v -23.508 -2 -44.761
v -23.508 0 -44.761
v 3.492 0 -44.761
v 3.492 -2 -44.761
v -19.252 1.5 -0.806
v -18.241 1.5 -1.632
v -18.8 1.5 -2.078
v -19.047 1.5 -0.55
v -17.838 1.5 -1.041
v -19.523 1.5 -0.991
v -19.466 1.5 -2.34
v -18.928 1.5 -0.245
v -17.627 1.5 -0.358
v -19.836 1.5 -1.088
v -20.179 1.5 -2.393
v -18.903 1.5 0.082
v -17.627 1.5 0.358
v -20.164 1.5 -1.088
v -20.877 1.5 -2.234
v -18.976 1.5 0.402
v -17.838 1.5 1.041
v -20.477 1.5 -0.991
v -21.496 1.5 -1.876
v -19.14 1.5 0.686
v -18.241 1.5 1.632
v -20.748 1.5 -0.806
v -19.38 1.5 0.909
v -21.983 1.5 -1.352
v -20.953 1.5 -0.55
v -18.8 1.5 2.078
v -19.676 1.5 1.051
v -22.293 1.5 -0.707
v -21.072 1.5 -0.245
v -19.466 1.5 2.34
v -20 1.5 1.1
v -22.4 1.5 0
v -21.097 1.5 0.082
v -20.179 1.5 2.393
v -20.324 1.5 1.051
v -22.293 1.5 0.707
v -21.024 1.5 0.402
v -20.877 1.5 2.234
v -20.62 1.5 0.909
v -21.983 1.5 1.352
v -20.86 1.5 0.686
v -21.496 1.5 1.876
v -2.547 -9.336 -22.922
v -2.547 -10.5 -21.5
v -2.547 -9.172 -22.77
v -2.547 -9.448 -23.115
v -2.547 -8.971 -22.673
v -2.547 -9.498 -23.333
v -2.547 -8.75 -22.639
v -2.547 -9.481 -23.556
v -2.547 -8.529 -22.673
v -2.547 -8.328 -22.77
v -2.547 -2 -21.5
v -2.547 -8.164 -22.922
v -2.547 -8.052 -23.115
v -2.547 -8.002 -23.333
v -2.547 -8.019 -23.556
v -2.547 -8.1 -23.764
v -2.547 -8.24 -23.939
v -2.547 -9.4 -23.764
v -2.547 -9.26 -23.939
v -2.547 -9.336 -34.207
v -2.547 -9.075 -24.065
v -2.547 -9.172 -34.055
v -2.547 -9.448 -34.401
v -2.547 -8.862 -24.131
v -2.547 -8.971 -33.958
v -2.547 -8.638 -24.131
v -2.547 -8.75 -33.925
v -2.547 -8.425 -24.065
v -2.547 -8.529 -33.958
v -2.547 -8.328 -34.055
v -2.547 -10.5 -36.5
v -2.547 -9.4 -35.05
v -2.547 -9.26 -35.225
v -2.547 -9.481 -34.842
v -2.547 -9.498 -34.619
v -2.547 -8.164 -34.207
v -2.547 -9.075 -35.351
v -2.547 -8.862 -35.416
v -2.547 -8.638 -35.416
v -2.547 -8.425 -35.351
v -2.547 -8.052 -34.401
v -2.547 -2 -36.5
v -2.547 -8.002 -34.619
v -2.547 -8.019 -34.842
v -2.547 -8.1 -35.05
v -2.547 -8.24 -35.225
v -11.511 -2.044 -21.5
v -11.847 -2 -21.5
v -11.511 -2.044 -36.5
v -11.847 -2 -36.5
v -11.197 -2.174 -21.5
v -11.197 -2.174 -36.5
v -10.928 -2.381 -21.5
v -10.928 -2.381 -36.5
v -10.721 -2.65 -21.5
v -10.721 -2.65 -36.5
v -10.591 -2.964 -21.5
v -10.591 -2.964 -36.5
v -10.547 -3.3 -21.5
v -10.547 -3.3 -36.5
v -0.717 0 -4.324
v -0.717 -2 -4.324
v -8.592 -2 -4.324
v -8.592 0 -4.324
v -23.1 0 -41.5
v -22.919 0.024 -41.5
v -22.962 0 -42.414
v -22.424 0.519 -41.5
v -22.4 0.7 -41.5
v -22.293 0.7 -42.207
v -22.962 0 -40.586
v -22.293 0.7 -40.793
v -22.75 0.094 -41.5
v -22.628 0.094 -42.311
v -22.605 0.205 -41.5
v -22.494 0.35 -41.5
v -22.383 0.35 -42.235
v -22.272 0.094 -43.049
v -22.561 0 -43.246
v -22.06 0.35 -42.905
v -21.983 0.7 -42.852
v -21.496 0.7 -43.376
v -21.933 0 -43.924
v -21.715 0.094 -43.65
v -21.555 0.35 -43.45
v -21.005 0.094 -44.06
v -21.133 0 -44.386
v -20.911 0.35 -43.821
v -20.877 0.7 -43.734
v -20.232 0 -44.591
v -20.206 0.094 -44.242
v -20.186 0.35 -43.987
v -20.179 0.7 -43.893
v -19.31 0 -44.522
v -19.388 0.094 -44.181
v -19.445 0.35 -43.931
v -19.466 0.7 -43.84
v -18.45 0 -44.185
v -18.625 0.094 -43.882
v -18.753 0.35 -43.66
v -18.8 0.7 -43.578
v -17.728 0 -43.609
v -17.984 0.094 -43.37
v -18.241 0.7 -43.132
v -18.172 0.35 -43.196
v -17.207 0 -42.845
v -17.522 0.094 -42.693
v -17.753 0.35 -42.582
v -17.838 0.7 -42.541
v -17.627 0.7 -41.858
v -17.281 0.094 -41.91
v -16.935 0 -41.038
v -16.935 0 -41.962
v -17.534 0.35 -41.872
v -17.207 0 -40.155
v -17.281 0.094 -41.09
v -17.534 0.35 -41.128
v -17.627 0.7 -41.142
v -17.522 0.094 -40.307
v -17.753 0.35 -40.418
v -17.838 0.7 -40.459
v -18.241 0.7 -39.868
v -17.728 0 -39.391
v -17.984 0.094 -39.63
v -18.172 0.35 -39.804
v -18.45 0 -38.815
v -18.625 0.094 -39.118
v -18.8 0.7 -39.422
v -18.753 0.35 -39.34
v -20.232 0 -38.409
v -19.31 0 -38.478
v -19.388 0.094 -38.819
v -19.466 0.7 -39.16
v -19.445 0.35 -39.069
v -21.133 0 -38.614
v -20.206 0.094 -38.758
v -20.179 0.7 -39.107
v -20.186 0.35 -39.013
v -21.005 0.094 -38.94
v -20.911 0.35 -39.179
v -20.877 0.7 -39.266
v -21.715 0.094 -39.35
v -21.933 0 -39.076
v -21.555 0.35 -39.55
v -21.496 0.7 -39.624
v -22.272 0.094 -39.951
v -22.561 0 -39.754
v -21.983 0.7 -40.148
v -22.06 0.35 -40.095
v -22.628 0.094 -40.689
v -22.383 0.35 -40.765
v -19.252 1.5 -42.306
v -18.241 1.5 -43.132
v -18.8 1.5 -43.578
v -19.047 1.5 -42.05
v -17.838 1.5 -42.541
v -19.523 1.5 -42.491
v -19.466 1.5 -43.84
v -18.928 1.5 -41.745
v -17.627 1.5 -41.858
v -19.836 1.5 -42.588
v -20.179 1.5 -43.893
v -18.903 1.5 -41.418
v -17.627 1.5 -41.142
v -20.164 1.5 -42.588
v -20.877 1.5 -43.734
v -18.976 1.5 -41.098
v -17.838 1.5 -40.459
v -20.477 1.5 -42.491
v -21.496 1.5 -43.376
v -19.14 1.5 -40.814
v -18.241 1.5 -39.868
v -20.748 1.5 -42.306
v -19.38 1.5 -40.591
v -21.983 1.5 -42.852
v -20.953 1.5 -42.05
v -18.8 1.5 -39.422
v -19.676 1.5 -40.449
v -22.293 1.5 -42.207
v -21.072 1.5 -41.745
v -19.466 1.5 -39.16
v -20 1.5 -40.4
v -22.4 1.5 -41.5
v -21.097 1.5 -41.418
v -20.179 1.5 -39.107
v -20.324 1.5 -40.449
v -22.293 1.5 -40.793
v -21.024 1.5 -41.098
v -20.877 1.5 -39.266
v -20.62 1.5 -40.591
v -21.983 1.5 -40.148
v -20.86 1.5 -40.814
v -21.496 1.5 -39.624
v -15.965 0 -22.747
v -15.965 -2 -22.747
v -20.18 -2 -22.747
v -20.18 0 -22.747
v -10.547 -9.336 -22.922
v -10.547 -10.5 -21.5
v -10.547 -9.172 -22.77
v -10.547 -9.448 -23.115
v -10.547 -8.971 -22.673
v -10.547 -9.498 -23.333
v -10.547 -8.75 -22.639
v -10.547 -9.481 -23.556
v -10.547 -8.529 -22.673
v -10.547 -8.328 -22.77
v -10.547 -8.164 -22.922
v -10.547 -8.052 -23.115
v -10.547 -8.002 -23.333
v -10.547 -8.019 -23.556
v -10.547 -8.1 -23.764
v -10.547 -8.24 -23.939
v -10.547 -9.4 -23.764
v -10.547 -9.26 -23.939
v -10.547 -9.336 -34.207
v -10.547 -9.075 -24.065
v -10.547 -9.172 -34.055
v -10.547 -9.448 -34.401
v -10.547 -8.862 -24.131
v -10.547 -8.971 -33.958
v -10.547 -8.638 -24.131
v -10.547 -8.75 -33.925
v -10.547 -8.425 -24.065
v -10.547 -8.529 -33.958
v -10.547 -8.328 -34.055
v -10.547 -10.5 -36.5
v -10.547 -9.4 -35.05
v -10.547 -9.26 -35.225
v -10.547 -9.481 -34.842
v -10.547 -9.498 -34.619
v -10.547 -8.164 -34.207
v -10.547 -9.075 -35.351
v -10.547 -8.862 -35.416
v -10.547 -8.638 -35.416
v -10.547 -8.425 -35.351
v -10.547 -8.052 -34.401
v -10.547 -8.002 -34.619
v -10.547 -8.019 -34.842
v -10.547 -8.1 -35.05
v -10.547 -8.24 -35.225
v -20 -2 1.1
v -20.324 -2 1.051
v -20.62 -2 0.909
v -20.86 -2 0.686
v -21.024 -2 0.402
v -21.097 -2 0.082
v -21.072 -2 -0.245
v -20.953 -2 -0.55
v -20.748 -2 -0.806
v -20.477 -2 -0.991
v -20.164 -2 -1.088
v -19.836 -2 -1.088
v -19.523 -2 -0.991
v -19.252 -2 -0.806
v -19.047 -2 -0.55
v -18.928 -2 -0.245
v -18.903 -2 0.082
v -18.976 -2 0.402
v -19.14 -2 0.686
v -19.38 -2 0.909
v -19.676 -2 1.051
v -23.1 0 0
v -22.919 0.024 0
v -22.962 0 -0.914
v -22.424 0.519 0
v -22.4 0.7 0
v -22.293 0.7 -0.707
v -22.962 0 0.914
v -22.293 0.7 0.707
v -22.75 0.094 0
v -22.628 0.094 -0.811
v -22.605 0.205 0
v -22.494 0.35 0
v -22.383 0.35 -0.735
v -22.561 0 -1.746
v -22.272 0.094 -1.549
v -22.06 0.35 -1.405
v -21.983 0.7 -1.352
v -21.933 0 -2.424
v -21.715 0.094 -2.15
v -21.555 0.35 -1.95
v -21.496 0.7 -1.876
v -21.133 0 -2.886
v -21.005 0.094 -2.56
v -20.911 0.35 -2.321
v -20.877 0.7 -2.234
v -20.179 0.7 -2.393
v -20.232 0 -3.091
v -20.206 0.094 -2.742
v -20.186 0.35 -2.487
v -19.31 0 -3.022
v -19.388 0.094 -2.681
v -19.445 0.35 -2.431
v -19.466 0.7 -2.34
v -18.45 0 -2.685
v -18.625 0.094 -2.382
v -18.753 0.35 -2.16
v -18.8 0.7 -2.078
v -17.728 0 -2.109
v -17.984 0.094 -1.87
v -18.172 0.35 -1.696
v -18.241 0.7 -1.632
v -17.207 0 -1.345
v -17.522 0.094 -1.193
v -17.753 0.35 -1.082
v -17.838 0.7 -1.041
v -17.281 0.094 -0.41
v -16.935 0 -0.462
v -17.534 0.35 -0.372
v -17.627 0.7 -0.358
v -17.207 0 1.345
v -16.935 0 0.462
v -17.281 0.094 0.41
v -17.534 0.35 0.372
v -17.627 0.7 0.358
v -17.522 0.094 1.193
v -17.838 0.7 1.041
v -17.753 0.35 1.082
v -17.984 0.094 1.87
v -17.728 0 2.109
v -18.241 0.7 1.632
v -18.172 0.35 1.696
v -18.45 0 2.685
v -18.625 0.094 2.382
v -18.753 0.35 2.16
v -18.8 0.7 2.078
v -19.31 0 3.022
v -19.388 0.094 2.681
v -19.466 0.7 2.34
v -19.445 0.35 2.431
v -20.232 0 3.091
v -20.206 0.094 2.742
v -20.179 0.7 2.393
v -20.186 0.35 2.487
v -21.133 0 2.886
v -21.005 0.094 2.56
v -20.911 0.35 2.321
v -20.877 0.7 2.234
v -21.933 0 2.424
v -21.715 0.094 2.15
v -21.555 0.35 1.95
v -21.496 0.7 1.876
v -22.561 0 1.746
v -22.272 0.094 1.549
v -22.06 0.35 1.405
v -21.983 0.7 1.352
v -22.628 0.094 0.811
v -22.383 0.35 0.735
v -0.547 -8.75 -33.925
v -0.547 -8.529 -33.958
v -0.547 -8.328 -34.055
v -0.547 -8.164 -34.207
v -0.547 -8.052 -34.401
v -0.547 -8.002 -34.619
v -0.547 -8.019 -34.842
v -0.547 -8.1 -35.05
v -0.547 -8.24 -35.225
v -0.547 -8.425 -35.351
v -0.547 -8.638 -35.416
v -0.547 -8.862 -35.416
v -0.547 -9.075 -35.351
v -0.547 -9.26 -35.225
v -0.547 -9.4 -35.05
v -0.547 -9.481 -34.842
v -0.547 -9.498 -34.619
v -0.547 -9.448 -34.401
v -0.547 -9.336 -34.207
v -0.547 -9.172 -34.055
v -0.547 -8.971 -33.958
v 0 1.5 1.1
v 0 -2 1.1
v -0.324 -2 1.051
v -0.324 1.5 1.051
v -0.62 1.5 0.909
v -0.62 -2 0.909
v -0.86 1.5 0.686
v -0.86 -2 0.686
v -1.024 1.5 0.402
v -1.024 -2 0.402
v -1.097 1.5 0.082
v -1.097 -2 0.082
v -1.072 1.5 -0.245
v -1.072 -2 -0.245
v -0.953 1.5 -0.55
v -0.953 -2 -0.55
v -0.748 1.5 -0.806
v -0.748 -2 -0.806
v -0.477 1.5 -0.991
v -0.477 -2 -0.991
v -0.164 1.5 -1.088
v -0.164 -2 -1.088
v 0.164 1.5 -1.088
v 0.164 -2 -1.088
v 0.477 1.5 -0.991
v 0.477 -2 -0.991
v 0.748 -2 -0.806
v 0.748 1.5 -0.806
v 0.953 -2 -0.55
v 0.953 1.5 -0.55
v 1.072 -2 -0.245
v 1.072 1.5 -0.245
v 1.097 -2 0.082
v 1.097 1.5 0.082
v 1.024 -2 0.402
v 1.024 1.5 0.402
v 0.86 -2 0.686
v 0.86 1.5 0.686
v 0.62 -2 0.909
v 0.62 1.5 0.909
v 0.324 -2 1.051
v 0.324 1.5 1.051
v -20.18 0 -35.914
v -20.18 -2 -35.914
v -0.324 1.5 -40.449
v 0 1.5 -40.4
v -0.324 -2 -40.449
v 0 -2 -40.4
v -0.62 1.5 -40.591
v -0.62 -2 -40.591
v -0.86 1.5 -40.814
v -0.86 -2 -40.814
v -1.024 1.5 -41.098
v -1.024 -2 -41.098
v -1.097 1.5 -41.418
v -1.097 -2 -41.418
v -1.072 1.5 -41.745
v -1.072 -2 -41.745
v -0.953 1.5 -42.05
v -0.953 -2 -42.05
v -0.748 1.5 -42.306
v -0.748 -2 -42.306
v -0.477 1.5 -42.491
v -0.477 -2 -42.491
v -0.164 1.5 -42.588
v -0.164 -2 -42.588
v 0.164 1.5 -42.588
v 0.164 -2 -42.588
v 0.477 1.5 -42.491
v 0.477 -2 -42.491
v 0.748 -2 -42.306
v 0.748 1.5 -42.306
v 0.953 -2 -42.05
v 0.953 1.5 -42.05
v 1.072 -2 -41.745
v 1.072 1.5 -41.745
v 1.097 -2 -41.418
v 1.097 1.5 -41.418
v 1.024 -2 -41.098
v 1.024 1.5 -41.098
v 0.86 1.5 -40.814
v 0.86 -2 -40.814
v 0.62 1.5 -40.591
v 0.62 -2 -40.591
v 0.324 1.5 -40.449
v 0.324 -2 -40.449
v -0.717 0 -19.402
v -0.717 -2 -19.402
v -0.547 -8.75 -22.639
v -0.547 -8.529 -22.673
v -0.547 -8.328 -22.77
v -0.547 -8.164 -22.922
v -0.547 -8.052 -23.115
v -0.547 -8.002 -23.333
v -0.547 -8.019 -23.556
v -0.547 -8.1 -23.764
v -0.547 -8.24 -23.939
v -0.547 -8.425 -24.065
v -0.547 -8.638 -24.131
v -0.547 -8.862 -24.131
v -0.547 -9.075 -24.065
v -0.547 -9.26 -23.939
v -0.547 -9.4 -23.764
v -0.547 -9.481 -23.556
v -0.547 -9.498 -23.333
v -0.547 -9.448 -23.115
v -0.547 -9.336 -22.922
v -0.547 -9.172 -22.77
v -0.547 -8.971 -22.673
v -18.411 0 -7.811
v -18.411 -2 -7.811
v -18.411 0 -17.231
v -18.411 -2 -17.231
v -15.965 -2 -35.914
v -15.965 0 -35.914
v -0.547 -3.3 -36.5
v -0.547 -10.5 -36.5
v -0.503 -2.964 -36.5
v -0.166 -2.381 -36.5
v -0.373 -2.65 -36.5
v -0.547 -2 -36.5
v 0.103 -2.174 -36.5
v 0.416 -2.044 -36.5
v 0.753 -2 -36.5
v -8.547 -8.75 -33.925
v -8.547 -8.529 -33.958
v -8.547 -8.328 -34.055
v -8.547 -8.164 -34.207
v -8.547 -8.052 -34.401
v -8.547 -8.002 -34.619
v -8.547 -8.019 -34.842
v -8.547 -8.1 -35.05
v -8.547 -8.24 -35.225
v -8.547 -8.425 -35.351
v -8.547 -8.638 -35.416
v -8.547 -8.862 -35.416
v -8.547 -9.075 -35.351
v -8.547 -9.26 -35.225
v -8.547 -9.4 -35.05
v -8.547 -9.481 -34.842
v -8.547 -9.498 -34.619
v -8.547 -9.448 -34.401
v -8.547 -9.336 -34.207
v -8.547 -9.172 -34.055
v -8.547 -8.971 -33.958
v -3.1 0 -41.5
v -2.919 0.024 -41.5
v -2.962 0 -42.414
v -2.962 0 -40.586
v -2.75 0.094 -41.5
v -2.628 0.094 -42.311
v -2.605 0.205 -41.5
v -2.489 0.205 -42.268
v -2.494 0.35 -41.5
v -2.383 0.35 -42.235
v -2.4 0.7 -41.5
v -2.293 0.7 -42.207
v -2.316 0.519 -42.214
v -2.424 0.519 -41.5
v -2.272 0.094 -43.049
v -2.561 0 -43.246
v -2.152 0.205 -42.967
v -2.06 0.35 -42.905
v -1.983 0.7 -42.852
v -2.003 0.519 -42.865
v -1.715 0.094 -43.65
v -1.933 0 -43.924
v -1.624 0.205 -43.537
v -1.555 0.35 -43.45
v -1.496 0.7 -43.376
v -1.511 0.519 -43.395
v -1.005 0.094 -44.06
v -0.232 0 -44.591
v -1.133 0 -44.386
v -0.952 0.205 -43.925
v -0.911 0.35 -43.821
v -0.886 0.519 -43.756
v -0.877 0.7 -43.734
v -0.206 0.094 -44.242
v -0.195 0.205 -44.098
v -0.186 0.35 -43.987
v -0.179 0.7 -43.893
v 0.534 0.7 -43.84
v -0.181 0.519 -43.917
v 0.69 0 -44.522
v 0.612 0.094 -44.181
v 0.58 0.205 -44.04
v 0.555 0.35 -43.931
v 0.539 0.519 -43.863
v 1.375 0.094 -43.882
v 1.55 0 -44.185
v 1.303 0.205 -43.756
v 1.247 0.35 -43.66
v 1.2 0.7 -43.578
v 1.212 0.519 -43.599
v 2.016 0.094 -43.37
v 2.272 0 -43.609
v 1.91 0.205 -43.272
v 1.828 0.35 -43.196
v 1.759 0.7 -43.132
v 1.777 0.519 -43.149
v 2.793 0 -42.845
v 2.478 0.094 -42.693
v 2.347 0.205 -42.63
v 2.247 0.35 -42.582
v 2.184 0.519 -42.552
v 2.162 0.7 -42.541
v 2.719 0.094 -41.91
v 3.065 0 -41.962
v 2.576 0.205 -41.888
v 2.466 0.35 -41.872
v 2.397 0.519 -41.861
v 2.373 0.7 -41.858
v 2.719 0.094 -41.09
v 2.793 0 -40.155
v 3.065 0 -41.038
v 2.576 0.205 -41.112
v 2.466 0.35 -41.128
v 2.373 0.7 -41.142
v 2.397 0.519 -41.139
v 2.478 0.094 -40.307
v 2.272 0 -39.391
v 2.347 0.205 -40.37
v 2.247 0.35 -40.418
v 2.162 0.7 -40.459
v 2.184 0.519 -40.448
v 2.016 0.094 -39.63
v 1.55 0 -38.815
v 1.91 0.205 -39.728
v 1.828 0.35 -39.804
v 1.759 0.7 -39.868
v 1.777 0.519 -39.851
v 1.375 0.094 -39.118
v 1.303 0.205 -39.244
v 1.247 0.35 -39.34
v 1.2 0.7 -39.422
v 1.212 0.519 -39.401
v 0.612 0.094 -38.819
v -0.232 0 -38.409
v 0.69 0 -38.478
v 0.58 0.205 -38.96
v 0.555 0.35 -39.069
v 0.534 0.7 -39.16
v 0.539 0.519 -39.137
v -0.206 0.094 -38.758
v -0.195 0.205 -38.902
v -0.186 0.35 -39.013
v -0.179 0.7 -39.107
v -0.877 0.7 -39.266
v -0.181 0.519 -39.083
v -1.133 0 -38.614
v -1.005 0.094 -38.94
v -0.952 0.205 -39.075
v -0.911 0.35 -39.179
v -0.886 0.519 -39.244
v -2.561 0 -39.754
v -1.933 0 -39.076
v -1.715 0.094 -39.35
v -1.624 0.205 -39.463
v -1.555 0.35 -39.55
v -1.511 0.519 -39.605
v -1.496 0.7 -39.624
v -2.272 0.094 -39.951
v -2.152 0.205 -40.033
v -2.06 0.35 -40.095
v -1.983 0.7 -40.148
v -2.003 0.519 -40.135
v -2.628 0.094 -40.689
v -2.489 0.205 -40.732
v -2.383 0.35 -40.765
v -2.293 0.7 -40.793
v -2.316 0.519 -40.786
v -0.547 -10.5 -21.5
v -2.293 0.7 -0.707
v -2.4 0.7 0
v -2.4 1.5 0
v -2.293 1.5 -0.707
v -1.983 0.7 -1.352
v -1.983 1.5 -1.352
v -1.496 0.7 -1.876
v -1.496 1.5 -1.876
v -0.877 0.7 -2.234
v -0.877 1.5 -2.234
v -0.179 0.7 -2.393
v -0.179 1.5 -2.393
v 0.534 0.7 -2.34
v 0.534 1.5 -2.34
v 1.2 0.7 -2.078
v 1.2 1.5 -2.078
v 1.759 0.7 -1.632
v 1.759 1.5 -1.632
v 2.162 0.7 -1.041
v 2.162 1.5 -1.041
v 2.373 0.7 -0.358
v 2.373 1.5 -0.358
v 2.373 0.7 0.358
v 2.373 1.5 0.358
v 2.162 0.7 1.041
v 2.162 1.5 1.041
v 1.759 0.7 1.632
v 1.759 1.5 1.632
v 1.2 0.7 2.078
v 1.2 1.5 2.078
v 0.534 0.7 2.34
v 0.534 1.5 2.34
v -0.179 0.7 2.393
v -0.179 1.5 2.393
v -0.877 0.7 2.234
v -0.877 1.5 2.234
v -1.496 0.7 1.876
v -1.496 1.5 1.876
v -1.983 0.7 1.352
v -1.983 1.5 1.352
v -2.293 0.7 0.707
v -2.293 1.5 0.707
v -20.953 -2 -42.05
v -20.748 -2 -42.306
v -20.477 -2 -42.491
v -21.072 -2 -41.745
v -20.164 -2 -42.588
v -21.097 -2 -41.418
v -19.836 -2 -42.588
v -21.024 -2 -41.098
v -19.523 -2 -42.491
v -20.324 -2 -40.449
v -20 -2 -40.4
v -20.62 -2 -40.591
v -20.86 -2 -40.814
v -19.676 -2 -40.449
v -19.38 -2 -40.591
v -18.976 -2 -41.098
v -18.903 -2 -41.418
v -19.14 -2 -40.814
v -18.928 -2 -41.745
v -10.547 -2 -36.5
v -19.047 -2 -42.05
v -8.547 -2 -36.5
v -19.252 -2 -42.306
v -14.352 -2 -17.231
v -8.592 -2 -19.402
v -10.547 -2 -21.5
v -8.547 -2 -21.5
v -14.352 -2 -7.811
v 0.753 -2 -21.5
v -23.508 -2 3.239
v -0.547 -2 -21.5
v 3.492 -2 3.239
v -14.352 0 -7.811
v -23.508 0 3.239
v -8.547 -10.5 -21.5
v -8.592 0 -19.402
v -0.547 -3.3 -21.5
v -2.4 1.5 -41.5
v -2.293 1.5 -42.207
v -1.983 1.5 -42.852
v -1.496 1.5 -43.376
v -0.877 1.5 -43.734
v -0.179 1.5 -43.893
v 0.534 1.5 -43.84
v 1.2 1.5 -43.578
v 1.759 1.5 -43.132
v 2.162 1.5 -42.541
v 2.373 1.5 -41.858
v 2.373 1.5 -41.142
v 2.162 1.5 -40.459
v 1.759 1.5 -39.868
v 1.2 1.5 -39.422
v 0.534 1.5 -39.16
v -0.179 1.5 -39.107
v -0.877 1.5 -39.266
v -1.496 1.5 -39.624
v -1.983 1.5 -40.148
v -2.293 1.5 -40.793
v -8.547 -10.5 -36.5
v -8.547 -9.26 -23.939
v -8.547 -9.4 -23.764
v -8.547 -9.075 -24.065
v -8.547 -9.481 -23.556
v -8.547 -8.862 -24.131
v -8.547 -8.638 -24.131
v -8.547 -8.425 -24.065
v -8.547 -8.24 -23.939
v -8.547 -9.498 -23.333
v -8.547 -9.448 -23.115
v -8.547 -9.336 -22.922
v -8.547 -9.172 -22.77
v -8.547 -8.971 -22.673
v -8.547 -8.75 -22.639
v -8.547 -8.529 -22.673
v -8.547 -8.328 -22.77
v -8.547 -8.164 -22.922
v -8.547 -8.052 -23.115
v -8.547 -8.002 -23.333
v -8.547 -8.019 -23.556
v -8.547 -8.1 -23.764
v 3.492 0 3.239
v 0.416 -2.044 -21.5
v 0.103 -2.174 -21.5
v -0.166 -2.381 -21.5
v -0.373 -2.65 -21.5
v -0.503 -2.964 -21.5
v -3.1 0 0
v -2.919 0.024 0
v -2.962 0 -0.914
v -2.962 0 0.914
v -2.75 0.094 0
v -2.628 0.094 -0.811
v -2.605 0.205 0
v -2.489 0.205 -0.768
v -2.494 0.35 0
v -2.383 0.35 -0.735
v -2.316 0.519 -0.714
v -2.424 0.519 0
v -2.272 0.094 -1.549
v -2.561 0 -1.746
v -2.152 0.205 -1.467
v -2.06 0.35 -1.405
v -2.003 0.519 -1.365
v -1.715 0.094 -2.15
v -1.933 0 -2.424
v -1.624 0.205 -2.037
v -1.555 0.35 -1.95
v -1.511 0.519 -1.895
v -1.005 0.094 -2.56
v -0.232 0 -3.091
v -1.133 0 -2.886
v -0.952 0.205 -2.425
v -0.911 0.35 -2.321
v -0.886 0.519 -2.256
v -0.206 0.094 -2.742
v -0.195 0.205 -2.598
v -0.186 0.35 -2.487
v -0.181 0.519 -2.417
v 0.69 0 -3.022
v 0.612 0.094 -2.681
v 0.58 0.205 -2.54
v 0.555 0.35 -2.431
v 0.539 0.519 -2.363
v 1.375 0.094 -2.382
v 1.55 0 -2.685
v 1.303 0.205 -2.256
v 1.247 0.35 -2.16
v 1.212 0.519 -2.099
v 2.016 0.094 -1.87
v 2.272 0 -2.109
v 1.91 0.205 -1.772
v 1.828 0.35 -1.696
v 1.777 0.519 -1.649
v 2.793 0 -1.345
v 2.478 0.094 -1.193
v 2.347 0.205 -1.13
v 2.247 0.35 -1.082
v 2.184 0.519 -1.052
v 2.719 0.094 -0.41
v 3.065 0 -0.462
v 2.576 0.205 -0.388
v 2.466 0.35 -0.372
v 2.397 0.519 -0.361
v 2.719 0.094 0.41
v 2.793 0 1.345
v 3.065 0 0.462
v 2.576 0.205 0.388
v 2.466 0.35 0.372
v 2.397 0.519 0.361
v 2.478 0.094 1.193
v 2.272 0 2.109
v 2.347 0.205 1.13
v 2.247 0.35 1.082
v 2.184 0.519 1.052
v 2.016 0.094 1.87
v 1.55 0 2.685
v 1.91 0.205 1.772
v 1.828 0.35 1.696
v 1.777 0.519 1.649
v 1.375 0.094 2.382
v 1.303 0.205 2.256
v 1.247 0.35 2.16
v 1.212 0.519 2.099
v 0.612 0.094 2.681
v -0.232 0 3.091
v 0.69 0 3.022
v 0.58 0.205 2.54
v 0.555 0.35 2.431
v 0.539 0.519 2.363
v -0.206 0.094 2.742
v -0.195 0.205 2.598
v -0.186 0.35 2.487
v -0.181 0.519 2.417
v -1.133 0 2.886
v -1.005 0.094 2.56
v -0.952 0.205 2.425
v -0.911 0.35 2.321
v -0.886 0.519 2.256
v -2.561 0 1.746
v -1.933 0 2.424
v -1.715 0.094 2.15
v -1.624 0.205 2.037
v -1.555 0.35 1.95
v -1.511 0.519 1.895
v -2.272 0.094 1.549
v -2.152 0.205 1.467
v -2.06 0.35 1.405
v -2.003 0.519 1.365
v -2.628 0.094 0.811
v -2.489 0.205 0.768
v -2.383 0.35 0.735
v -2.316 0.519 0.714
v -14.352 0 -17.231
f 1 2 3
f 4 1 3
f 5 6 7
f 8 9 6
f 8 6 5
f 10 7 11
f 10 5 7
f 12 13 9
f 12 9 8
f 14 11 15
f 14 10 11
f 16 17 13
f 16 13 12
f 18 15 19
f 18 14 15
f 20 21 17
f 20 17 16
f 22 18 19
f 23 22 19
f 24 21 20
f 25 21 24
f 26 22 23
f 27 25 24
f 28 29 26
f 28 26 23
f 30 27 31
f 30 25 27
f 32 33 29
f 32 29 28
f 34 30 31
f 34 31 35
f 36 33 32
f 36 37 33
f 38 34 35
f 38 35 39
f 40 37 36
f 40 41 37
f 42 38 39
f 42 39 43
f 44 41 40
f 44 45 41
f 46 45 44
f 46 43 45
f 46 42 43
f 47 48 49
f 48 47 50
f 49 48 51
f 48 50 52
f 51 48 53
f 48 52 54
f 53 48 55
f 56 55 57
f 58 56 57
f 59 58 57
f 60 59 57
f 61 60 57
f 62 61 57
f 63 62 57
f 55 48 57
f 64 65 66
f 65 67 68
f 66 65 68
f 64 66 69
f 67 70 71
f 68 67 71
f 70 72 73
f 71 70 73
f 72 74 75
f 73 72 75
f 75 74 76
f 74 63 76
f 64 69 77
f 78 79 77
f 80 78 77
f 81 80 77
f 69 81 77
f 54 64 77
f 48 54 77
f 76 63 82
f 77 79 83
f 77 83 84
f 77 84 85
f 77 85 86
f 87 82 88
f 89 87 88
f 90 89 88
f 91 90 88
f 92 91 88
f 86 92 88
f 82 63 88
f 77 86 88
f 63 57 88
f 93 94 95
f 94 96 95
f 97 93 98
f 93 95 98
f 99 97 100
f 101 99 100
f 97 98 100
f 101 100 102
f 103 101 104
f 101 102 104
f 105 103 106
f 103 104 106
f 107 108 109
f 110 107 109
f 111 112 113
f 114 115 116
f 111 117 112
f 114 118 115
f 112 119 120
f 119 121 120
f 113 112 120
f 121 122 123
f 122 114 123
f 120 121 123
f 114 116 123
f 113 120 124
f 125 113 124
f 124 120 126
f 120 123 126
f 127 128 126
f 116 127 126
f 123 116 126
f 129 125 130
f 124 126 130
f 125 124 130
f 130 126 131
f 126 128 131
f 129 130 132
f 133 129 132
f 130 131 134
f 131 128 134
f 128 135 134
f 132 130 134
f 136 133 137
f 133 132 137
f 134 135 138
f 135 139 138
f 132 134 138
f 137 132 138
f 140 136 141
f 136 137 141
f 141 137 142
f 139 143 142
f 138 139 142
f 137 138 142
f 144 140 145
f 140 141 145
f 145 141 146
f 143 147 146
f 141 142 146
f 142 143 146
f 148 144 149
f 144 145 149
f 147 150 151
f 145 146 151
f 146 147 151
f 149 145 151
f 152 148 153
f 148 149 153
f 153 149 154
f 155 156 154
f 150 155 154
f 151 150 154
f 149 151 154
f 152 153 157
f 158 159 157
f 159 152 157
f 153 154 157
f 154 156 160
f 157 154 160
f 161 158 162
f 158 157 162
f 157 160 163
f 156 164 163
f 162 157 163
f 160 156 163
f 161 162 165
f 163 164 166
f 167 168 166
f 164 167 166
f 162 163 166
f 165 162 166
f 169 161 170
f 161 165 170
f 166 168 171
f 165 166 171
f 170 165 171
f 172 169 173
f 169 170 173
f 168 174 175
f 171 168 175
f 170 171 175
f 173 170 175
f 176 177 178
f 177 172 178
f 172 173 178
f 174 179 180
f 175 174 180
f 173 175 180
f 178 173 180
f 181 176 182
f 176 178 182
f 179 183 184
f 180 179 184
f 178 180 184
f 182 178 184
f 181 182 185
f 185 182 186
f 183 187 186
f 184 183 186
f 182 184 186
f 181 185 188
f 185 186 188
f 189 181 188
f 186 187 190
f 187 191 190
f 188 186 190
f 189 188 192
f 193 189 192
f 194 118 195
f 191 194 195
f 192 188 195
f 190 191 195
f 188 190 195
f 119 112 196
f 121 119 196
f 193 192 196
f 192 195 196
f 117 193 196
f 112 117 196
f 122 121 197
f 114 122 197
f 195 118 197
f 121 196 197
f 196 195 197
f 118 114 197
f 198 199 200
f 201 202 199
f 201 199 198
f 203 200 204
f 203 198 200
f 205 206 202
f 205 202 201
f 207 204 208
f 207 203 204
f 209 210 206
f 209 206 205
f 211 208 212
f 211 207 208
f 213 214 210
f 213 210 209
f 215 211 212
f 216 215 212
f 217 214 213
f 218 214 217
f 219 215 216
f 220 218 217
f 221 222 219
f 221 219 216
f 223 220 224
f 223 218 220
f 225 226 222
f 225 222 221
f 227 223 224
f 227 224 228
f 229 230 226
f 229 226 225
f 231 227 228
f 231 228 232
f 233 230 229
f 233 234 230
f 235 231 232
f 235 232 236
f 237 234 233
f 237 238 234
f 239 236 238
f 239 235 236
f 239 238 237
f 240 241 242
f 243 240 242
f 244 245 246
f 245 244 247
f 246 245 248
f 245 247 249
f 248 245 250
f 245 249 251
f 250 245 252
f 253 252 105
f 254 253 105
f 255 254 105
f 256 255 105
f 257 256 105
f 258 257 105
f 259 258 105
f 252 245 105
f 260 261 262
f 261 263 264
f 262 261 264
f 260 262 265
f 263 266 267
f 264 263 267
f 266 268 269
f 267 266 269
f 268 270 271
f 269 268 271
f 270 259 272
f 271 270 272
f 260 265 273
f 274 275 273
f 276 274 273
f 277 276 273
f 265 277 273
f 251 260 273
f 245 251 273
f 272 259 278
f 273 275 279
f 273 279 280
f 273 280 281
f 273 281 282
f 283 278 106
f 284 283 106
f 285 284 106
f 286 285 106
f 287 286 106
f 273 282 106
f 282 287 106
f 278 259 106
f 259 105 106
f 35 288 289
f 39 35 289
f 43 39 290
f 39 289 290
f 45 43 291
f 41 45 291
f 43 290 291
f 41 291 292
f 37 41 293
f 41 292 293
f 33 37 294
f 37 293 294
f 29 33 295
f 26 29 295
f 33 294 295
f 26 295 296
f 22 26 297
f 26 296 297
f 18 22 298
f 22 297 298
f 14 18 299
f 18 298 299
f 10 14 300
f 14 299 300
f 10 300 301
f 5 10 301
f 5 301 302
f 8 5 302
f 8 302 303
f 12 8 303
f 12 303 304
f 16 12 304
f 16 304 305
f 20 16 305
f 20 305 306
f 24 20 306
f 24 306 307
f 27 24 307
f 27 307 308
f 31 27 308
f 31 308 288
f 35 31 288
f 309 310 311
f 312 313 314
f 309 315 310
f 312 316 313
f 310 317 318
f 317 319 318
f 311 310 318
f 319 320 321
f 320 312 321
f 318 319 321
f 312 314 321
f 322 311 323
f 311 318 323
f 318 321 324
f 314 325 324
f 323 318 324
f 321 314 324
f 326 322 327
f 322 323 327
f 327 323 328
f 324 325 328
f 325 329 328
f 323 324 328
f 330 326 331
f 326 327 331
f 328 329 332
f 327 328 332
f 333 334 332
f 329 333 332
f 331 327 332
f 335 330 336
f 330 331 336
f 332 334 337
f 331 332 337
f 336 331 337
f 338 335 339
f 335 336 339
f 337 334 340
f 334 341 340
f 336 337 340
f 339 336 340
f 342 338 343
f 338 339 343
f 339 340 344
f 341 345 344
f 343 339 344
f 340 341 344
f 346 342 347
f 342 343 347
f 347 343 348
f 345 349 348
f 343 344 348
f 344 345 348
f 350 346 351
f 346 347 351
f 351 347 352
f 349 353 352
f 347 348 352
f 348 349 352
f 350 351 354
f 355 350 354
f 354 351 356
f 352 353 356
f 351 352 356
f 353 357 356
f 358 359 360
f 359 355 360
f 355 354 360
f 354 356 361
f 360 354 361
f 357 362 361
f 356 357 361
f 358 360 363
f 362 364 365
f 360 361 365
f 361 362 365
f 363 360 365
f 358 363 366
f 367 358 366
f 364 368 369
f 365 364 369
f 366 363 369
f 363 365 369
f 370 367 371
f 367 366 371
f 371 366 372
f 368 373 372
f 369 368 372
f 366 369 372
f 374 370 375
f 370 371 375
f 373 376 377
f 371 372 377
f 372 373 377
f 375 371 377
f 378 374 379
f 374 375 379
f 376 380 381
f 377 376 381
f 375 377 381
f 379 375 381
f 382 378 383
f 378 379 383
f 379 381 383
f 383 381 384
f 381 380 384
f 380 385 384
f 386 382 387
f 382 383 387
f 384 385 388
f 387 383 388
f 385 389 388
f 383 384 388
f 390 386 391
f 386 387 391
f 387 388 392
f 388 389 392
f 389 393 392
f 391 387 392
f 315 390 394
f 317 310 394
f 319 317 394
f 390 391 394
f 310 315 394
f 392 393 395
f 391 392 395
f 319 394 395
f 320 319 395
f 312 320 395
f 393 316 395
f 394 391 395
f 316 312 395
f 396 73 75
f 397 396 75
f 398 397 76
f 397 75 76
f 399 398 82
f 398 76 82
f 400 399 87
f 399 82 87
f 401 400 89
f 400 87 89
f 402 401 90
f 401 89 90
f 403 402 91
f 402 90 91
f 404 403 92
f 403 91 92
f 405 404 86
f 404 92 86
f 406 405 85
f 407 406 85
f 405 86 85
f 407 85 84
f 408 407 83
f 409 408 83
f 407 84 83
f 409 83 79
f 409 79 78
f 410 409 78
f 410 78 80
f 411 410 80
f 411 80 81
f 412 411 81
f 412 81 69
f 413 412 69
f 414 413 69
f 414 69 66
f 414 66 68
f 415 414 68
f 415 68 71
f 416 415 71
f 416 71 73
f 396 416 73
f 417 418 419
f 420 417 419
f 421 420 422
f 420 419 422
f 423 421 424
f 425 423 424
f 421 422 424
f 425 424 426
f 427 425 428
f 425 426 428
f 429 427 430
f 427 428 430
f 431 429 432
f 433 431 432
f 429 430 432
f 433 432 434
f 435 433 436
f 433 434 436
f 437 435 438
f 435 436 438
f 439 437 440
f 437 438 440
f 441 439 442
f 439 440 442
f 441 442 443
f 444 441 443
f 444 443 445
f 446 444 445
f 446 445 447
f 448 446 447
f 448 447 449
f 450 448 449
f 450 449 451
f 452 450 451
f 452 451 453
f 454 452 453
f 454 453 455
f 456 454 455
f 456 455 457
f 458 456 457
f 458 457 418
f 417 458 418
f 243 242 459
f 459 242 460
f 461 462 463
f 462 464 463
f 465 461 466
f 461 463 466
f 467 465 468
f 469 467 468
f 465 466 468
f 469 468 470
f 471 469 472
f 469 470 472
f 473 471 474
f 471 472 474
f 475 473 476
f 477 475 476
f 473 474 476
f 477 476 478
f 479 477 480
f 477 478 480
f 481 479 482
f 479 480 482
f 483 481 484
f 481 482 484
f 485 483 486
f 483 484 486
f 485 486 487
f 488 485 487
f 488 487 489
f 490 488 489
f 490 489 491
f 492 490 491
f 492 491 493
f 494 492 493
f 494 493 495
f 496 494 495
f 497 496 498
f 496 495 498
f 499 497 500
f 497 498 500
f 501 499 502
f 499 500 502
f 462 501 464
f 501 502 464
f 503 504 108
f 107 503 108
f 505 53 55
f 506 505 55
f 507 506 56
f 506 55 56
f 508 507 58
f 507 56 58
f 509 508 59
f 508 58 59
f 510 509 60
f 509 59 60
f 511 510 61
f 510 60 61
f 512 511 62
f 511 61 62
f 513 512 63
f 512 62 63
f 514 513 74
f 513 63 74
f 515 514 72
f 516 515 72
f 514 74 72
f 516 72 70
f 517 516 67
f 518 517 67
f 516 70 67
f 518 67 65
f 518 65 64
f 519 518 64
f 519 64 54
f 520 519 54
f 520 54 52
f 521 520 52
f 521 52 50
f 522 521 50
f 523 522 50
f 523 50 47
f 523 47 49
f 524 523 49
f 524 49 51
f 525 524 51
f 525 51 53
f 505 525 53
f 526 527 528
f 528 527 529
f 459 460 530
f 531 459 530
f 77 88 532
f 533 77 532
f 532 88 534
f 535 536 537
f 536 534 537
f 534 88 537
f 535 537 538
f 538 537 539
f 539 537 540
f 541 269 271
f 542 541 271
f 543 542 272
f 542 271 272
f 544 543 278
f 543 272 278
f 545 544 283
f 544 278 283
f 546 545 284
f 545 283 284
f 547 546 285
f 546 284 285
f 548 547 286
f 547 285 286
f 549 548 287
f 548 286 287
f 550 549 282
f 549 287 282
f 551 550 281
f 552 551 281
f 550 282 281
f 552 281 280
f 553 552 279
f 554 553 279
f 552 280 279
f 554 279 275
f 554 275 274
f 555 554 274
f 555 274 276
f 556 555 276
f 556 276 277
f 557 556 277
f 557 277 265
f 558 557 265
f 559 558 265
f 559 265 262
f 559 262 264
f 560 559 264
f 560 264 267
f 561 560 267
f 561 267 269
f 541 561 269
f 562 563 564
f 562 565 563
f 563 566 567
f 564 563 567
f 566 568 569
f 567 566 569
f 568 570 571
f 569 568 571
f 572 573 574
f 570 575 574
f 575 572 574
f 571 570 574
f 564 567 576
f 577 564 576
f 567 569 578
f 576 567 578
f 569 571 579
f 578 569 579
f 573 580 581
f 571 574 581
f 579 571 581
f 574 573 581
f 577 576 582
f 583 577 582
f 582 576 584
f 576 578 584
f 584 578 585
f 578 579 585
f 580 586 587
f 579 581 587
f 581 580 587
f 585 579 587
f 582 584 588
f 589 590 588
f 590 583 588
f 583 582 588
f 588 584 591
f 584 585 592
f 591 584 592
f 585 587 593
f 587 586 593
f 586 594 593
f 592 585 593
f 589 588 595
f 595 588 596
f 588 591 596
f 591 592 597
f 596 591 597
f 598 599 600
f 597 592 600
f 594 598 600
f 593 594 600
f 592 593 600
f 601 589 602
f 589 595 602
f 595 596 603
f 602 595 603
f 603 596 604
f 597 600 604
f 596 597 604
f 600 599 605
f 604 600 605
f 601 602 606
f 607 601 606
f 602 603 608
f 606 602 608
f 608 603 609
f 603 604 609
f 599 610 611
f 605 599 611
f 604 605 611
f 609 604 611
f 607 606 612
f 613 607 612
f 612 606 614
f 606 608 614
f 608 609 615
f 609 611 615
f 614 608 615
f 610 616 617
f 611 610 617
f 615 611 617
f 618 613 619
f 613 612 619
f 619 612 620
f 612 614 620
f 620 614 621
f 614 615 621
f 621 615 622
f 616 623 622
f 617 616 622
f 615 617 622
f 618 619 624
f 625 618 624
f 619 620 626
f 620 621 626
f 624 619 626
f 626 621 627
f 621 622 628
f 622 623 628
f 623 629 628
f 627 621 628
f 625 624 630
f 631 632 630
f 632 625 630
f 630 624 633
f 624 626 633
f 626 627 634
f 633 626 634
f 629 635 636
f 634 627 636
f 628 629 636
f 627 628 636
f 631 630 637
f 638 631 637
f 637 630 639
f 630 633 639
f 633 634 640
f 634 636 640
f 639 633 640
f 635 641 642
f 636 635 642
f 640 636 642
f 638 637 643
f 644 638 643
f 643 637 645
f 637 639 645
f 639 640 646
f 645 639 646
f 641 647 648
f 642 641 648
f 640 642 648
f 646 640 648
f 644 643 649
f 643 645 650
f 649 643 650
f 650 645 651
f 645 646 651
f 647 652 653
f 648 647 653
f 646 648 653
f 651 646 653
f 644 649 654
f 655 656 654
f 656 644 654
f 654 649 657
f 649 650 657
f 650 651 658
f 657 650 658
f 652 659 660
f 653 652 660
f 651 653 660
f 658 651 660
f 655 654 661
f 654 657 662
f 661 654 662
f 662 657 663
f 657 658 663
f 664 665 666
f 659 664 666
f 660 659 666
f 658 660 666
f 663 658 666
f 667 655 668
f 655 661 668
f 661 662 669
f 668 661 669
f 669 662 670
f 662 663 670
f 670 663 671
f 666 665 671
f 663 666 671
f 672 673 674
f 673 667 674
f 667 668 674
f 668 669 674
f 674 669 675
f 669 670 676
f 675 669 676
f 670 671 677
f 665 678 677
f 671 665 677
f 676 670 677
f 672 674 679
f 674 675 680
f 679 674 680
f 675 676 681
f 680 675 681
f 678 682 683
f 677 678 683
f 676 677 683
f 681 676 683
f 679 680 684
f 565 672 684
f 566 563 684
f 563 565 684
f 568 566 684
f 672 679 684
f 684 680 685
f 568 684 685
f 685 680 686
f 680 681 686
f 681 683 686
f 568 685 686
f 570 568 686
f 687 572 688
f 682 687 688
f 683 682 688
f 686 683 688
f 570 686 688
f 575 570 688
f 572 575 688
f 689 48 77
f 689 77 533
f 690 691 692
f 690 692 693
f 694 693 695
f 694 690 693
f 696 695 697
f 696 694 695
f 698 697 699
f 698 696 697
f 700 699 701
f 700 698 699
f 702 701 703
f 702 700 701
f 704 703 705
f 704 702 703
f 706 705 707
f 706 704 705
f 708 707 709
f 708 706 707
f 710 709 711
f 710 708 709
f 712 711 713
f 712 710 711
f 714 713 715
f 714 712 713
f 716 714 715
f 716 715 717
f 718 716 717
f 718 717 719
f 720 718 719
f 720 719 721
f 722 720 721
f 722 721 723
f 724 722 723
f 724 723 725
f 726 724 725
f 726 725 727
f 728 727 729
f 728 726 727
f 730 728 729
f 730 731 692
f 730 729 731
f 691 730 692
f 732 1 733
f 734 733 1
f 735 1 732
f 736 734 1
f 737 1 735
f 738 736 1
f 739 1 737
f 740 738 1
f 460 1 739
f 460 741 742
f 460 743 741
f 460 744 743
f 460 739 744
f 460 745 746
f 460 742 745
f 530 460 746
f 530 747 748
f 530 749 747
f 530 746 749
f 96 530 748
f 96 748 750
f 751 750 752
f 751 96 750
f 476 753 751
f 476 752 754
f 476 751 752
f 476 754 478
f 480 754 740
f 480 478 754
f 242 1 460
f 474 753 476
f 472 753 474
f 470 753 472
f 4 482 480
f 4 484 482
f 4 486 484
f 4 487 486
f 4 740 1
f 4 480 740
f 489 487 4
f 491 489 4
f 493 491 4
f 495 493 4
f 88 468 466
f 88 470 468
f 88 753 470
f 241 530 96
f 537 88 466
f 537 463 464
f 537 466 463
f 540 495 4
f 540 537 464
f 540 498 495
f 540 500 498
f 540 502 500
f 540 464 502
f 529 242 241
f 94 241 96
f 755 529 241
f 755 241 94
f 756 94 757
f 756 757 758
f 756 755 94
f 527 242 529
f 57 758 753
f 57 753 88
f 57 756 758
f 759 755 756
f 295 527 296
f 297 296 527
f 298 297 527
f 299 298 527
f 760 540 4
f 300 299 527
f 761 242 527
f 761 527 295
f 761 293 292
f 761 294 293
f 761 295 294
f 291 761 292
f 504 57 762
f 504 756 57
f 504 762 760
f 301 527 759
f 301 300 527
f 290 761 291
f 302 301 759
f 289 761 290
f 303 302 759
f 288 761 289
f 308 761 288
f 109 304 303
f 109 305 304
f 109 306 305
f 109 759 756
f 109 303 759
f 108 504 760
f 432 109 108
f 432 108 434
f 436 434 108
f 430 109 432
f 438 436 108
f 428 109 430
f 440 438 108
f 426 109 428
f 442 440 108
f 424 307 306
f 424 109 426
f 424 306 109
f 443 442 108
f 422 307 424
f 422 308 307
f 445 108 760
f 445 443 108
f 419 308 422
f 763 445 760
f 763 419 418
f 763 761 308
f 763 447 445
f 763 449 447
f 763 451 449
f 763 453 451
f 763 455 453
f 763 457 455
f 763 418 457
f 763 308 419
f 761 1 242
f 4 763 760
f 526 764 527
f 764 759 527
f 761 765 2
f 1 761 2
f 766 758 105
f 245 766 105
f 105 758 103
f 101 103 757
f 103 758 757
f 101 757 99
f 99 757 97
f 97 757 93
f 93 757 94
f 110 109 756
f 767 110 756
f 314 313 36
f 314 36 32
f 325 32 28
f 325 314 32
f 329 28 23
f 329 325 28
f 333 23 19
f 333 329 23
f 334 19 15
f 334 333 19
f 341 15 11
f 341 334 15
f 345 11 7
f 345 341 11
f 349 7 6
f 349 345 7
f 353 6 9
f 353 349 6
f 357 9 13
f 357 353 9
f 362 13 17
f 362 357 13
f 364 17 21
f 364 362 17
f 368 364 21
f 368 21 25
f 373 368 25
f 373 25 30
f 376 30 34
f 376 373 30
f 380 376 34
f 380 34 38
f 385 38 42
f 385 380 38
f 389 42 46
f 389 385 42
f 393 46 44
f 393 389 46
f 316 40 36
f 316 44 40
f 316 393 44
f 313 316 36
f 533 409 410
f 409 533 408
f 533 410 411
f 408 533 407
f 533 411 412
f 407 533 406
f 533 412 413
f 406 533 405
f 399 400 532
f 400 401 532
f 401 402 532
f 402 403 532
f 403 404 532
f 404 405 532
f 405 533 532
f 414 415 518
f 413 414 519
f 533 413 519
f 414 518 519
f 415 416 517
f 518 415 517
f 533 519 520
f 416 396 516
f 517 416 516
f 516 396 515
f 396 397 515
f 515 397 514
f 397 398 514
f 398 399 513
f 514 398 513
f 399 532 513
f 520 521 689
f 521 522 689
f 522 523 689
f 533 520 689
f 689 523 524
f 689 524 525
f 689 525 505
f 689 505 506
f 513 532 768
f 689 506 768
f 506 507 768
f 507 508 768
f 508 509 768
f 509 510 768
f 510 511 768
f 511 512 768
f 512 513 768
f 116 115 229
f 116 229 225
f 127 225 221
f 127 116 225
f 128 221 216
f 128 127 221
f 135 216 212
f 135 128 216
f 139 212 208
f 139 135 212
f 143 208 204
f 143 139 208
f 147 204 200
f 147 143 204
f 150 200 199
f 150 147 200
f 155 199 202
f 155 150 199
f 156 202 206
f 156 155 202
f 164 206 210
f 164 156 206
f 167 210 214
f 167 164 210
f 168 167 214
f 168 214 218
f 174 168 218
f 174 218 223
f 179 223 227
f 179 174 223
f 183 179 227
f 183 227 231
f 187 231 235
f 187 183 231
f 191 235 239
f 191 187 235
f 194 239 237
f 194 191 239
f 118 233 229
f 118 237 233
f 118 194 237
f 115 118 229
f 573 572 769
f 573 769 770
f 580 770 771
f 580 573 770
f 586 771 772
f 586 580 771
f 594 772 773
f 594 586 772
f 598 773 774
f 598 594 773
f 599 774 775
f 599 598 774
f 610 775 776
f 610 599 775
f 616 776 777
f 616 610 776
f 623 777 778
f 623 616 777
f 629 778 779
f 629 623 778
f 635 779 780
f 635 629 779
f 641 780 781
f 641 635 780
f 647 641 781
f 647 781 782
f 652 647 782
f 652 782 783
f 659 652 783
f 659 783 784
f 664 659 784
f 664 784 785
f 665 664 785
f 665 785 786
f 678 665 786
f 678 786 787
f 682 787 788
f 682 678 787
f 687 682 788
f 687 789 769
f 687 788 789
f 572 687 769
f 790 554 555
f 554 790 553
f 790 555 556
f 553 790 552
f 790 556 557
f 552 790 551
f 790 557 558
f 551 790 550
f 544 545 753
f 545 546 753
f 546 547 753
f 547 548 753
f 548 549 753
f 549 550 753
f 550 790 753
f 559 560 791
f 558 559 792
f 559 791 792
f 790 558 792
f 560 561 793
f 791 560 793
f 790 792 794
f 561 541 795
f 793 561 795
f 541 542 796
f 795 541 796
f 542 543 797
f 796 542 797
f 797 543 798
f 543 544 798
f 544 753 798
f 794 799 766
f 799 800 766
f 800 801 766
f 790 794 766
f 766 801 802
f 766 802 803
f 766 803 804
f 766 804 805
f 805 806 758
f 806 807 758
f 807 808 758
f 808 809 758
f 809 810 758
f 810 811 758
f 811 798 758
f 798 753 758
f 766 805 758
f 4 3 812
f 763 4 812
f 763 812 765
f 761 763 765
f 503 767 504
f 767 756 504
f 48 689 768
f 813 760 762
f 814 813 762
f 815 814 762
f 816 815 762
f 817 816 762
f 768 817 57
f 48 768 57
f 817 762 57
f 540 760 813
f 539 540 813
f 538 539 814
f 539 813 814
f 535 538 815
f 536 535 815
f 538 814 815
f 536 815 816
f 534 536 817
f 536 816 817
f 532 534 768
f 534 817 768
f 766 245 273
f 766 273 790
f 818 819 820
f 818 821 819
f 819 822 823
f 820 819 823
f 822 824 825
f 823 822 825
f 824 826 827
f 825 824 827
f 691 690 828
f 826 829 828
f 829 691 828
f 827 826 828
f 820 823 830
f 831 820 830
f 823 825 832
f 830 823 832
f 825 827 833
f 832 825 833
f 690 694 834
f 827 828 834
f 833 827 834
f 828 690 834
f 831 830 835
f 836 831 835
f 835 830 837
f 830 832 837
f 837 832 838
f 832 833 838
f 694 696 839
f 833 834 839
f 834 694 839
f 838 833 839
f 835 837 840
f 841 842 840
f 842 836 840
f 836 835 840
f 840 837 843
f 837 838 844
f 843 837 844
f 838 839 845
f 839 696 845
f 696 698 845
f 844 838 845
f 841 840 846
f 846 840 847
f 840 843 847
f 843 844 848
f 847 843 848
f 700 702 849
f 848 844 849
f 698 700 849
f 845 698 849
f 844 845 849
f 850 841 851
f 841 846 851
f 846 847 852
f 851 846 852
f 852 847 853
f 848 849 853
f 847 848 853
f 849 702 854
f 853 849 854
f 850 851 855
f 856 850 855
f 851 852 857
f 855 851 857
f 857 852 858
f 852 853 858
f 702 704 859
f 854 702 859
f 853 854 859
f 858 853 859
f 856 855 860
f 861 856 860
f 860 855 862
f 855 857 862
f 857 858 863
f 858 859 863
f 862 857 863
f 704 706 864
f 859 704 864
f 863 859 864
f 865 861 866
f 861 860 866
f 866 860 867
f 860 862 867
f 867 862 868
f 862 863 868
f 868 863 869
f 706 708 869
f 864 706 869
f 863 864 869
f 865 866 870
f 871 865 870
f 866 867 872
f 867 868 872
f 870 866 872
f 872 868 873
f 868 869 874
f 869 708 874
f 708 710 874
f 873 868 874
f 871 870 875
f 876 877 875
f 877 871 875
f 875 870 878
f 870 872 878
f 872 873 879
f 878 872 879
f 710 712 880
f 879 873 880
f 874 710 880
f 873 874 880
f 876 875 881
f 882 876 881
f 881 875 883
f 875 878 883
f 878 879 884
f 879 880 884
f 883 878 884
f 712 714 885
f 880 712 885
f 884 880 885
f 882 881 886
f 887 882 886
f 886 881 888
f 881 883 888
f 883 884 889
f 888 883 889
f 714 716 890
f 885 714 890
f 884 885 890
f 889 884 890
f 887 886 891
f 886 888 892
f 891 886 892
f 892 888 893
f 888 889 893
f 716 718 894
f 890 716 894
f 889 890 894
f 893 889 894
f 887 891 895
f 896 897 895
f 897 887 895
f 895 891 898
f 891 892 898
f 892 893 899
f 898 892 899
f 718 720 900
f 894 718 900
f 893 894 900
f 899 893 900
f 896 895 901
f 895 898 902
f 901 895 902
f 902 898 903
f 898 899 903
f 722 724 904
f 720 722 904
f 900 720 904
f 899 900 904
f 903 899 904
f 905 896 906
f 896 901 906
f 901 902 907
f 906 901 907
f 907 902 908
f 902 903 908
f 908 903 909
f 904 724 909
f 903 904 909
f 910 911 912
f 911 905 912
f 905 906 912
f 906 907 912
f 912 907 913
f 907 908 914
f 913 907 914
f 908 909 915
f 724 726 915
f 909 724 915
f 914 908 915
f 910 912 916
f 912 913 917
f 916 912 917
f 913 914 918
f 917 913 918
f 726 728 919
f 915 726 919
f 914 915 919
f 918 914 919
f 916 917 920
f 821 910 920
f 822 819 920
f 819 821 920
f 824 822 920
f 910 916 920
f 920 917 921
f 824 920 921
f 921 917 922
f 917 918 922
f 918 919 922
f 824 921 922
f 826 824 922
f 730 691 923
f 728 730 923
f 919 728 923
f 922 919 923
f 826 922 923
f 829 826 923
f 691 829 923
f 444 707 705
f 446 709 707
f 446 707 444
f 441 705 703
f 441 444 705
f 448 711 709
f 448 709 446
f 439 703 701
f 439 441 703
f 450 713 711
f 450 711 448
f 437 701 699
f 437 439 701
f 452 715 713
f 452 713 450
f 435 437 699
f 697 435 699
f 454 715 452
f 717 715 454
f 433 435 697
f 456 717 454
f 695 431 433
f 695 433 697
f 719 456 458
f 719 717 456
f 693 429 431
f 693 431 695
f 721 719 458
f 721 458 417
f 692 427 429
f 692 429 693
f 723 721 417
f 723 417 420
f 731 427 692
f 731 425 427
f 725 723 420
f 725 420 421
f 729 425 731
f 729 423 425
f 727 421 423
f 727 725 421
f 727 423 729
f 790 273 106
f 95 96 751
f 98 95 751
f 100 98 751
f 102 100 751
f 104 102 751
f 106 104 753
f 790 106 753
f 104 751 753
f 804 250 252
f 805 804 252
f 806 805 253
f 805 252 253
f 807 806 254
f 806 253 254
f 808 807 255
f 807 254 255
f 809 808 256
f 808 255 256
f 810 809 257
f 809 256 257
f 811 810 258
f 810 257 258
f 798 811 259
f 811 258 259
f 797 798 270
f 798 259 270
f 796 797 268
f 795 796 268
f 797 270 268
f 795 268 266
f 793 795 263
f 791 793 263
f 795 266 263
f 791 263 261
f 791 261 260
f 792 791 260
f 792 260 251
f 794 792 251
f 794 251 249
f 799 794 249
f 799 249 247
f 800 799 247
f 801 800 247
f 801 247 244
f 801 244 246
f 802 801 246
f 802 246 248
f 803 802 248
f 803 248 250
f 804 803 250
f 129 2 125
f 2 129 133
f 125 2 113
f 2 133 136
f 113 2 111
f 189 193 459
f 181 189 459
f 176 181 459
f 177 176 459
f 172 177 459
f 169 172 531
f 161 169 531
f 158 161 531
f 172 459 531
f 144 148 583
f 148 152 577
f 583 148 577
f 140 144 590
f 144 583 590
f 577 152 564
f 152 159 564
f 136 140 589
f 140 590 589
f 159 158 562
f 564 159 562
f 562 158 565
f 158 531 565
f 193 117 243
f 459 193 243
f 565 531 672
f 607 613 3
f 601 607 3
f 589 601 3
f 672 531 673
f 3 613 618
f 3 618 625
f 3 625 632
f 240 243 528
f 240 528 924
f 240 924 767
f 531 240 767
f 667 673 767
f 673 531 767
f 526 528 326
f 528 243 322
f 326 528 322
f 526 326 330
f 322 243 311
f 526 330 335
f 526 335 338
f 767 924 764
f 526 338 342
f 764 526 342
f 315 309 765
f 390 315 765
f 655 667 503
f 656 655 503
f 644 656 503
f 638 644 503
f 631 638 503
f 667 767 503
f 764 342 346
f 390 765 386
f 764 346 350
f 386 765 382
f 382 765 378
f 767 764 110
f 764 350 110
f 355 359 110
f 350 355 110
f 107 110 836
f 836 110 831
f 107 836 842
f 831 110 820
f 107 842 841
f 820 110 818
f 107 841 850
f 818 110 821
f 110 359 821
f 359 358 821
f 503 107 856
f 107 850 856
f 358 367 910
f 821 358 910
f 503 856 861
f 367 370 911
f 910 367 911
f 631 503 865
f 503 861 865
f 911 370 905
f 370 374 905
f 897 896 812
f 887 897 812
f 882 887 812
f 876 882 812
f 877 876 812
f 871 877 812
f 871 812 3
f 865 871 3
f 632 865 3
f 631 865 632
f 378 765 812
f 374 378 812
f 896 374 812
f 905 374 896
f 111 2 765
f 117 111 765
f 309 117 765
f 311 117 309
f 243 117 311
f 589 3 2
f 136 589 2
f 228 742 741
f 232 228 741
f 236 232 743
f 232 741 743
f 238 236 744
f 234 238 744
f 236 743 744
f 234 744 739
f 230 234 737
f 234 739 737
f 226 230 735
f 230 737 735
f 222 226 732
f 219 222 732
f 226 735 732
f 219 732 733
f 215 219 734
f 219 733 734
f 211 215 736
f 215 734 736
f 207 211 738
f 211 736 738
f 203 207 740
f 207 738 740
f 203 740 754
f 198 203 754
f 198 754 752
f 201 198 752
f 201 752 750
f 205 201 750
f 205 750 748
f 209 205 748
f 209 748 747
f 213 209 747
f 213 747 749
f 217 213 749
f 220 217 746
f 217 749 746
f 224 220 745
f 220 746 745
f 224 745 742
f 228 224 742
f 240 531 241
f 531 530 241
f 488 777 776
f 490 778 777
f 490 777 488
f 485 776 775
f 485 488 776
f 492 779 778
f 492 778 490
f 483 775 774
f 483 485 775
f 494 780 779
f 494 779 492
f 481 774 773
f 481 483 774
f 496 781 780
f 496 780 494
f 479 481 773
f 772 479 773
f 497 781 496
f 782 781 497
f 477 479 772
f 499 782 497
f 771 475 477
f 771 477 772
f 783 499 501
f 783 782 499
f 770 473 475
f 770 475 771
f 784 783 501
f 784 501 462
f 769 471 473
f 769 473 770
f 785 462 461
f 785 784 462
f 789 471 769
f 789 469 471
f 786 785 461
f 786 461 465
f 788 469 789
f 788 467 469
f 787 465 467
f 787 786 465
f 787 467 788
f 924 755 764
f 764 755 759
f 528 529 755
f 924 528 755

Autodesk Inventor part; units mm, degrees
ref_plane "YZ Plane" through (0, 0, 0) normal (1, 0, 0) x (0, 1, 0)
ref_plane "XZ Plane" through (0, 0, 0) normal (0, 1, 0) x (-1, 0, 0)
ref_plane "XY Plane" through (0, 0, 0) normal (0, 0, 1) x (1, 0, 0)
sketch "Sketch1" plane through (0, 0, 0) normal (0, 1, 0) x (-1, 0, 0)
  circle A0 centre (0, 0) radius 2.4
  circle A1 centre (20, 0) radius 2.4
  circle A2 centre (20, -41.5) radius 2.4
  circle A3 centre (0, -41.5) radius 2.4
  dimension "d0" = 4.8
  dimension "d4" = 20
  dimension "d5" = 41.5
extrude "Extrusion1" add sketch "Sketch1" along normal blind 1.5
sketch "Sketch2" plane through (0, 0, 0) normal (0, -1, 0) x (1, 0, 0)
  circle A0 centre (0, 0) radius 2.4 construction
  circle A1 centre (0, -41.5) radius 2.4 construction
  circle A2 centre (-20, -41.5) radius 2.4 construction
  circle A3 centre (-20, 0) radius 2.4 construction
  line L0 (3.492, 3.2394) -> (-23.508, 3.2394)
  line L1 (-23.508, 3.2394) -> (-23.508, -44.7606)
  line L2 (-23.508, -44.7606) -> (3.492, -44.7606)
  line L3 (3.492, -44.7606) -> (3.492, 3.2394)
  dimension "d8" = 27
  dimension "d9" = 48
extrude "Extrusion2" add sketch "Sketch2" along normal blind 2
sketch "Sketch3" plane through (0, -2, 0) normal (0, -1, 0) x (1, 0, 0)
  circle A0 centre (0, 0) radius 2.4 construction
  circle A1 centre (0, -41.5) radius 2.4 construction
  circle A2 centre (-20, -41.5) radius 2.4 construction
  circle A3 centre (-20, 0) radius 2.4 construction
  line L0 (-8.5471, -21.5) -> (-10.5471, -21.5)
  line L1 (-10.5471, -21.5) -> (-10.5471, -36.5)
  line L2 (-10.5471, -36.5) -> (-8.5471, -36.5)
  line L3 (-8.5471, -36.5) -> (-8.5471, -21.5)
  line L4 (-0.5471, -21.5) -> (-2.5471, -21.5)
  line L5 (-2.5471, -21.5) -> (-2.5471, -36.5)
  line L6 (-2.5471, -36.5) -> (-0.5471, -36.5)
  line L7 (-0.5471, -36.5) -> (-0.5471, -21.5)
  line L8 (0, 0) -> (0, -41.5) construction
  dimension "d12" = 2
  dimension "d13" = 2
  dimension "d14" = 15
  dimension "d15" = 6
  dimension "d17" = 5
extrude "Extrusion3" add sketch "Sketch3" along normal blind 8.5
sketch "Sketch4" plane through (-10.5471, -2, -36.5) normal (-1, 0, 0) x (0, 0, 1)
  line L0 (15, 0) -> (15, -8.5) construction
  line L1 (15, -6) -> (0, -6) construction
  line L2 (0, 0) -> (0, -8.5) construction
  circle A0 centre (13.1106, -6.75) radius 0.75
  circle A1 centre (1.8252, -6.75) radius 0.75
  line L3 (39.7394, 0) -> (-8.2606, 0) projected
  point P0 (36.5, 2)
  dimension "d21" = 1.5
  dimension "d22" = 0.75
  dimension "d23" = 1.5
  dimension "d24" = 0.75
  dimension "d25" = 6
extrude "Extrusion4" cut sketch "Sketch4" against normal through all
sketch "Sketch6" plane through (0, -2, 0) normal (0, -1, 0) x (1, 0, 0)
  line L0 (-0.7166, -4.3244) -> (-8.5921, -4.3244)
  line L1 (-8.5921, -4.3244) -> (-8.5921, -19.4025)
  line L2 (-8.5921, -19.4025) -> (-0.7166, -19.4025)
  line L3 (-0.7166, -19.4025) -> (-0.7166, -4.3244)
  line L4 (-14.3515, -7.8111) -> (-18.4107, -7.8111)
  line L5 (-18.4107, -7.8111) -> (-18.4107, -17.2306)
  line L6 (-18.4107, -17.2306) -> (-14.3515, -17.2306)
  line L7 (-14.3515, -17.2306) -> (-14.3515, -7.8111)
  line L8 (-15.9648, -22.747) -> (-20.1801, -22.747)
  line L9 (-20.1801, -22.747) -> (-20.1801, -35.9136)
  line L10 (-20.1801, -35.9136) -> (-15.9648, -35.9136)
  line L11 (-15.9648, -35.9136) -> (-15.9648, -22.747)
  point P0 (0, 0)
extrude "Extrusion6" cut sketch "Sketch6" against normal through all
hole "Hole1" at (0, 1.5, -41.5) direction (0, -1, 0) diameter 2.2 depth 8 tip angle 118
hole "Hole2" at (0, 1.5, 0) direction (0, -1, 0) diameter 2.2 depth 8 tip angle 118
hole "Hole3" at (-20, 1.5, -41.5) direction (0, -1, 0) diameter 2.2 depth 8 tip angle 118
hole "Hole4" at (-20, 1.5, 0) direction (0, -1, 0) diameter 2.2 depth 8 tip angle 118
fillet "Fillet1" radius 0.7 4 edges at (-17.6, 0, 0) (2.4, 0, 0) (2.4, 0, -41.5) (-17.6, 0, -41.5)
fillet "Fillet2" radius 1.3 2 edges at (-10.5471, -2, -29) (-0.5471, -2, -29)
properties part number "holder_board_basecam_simpleBCG_32bit_tiny"
